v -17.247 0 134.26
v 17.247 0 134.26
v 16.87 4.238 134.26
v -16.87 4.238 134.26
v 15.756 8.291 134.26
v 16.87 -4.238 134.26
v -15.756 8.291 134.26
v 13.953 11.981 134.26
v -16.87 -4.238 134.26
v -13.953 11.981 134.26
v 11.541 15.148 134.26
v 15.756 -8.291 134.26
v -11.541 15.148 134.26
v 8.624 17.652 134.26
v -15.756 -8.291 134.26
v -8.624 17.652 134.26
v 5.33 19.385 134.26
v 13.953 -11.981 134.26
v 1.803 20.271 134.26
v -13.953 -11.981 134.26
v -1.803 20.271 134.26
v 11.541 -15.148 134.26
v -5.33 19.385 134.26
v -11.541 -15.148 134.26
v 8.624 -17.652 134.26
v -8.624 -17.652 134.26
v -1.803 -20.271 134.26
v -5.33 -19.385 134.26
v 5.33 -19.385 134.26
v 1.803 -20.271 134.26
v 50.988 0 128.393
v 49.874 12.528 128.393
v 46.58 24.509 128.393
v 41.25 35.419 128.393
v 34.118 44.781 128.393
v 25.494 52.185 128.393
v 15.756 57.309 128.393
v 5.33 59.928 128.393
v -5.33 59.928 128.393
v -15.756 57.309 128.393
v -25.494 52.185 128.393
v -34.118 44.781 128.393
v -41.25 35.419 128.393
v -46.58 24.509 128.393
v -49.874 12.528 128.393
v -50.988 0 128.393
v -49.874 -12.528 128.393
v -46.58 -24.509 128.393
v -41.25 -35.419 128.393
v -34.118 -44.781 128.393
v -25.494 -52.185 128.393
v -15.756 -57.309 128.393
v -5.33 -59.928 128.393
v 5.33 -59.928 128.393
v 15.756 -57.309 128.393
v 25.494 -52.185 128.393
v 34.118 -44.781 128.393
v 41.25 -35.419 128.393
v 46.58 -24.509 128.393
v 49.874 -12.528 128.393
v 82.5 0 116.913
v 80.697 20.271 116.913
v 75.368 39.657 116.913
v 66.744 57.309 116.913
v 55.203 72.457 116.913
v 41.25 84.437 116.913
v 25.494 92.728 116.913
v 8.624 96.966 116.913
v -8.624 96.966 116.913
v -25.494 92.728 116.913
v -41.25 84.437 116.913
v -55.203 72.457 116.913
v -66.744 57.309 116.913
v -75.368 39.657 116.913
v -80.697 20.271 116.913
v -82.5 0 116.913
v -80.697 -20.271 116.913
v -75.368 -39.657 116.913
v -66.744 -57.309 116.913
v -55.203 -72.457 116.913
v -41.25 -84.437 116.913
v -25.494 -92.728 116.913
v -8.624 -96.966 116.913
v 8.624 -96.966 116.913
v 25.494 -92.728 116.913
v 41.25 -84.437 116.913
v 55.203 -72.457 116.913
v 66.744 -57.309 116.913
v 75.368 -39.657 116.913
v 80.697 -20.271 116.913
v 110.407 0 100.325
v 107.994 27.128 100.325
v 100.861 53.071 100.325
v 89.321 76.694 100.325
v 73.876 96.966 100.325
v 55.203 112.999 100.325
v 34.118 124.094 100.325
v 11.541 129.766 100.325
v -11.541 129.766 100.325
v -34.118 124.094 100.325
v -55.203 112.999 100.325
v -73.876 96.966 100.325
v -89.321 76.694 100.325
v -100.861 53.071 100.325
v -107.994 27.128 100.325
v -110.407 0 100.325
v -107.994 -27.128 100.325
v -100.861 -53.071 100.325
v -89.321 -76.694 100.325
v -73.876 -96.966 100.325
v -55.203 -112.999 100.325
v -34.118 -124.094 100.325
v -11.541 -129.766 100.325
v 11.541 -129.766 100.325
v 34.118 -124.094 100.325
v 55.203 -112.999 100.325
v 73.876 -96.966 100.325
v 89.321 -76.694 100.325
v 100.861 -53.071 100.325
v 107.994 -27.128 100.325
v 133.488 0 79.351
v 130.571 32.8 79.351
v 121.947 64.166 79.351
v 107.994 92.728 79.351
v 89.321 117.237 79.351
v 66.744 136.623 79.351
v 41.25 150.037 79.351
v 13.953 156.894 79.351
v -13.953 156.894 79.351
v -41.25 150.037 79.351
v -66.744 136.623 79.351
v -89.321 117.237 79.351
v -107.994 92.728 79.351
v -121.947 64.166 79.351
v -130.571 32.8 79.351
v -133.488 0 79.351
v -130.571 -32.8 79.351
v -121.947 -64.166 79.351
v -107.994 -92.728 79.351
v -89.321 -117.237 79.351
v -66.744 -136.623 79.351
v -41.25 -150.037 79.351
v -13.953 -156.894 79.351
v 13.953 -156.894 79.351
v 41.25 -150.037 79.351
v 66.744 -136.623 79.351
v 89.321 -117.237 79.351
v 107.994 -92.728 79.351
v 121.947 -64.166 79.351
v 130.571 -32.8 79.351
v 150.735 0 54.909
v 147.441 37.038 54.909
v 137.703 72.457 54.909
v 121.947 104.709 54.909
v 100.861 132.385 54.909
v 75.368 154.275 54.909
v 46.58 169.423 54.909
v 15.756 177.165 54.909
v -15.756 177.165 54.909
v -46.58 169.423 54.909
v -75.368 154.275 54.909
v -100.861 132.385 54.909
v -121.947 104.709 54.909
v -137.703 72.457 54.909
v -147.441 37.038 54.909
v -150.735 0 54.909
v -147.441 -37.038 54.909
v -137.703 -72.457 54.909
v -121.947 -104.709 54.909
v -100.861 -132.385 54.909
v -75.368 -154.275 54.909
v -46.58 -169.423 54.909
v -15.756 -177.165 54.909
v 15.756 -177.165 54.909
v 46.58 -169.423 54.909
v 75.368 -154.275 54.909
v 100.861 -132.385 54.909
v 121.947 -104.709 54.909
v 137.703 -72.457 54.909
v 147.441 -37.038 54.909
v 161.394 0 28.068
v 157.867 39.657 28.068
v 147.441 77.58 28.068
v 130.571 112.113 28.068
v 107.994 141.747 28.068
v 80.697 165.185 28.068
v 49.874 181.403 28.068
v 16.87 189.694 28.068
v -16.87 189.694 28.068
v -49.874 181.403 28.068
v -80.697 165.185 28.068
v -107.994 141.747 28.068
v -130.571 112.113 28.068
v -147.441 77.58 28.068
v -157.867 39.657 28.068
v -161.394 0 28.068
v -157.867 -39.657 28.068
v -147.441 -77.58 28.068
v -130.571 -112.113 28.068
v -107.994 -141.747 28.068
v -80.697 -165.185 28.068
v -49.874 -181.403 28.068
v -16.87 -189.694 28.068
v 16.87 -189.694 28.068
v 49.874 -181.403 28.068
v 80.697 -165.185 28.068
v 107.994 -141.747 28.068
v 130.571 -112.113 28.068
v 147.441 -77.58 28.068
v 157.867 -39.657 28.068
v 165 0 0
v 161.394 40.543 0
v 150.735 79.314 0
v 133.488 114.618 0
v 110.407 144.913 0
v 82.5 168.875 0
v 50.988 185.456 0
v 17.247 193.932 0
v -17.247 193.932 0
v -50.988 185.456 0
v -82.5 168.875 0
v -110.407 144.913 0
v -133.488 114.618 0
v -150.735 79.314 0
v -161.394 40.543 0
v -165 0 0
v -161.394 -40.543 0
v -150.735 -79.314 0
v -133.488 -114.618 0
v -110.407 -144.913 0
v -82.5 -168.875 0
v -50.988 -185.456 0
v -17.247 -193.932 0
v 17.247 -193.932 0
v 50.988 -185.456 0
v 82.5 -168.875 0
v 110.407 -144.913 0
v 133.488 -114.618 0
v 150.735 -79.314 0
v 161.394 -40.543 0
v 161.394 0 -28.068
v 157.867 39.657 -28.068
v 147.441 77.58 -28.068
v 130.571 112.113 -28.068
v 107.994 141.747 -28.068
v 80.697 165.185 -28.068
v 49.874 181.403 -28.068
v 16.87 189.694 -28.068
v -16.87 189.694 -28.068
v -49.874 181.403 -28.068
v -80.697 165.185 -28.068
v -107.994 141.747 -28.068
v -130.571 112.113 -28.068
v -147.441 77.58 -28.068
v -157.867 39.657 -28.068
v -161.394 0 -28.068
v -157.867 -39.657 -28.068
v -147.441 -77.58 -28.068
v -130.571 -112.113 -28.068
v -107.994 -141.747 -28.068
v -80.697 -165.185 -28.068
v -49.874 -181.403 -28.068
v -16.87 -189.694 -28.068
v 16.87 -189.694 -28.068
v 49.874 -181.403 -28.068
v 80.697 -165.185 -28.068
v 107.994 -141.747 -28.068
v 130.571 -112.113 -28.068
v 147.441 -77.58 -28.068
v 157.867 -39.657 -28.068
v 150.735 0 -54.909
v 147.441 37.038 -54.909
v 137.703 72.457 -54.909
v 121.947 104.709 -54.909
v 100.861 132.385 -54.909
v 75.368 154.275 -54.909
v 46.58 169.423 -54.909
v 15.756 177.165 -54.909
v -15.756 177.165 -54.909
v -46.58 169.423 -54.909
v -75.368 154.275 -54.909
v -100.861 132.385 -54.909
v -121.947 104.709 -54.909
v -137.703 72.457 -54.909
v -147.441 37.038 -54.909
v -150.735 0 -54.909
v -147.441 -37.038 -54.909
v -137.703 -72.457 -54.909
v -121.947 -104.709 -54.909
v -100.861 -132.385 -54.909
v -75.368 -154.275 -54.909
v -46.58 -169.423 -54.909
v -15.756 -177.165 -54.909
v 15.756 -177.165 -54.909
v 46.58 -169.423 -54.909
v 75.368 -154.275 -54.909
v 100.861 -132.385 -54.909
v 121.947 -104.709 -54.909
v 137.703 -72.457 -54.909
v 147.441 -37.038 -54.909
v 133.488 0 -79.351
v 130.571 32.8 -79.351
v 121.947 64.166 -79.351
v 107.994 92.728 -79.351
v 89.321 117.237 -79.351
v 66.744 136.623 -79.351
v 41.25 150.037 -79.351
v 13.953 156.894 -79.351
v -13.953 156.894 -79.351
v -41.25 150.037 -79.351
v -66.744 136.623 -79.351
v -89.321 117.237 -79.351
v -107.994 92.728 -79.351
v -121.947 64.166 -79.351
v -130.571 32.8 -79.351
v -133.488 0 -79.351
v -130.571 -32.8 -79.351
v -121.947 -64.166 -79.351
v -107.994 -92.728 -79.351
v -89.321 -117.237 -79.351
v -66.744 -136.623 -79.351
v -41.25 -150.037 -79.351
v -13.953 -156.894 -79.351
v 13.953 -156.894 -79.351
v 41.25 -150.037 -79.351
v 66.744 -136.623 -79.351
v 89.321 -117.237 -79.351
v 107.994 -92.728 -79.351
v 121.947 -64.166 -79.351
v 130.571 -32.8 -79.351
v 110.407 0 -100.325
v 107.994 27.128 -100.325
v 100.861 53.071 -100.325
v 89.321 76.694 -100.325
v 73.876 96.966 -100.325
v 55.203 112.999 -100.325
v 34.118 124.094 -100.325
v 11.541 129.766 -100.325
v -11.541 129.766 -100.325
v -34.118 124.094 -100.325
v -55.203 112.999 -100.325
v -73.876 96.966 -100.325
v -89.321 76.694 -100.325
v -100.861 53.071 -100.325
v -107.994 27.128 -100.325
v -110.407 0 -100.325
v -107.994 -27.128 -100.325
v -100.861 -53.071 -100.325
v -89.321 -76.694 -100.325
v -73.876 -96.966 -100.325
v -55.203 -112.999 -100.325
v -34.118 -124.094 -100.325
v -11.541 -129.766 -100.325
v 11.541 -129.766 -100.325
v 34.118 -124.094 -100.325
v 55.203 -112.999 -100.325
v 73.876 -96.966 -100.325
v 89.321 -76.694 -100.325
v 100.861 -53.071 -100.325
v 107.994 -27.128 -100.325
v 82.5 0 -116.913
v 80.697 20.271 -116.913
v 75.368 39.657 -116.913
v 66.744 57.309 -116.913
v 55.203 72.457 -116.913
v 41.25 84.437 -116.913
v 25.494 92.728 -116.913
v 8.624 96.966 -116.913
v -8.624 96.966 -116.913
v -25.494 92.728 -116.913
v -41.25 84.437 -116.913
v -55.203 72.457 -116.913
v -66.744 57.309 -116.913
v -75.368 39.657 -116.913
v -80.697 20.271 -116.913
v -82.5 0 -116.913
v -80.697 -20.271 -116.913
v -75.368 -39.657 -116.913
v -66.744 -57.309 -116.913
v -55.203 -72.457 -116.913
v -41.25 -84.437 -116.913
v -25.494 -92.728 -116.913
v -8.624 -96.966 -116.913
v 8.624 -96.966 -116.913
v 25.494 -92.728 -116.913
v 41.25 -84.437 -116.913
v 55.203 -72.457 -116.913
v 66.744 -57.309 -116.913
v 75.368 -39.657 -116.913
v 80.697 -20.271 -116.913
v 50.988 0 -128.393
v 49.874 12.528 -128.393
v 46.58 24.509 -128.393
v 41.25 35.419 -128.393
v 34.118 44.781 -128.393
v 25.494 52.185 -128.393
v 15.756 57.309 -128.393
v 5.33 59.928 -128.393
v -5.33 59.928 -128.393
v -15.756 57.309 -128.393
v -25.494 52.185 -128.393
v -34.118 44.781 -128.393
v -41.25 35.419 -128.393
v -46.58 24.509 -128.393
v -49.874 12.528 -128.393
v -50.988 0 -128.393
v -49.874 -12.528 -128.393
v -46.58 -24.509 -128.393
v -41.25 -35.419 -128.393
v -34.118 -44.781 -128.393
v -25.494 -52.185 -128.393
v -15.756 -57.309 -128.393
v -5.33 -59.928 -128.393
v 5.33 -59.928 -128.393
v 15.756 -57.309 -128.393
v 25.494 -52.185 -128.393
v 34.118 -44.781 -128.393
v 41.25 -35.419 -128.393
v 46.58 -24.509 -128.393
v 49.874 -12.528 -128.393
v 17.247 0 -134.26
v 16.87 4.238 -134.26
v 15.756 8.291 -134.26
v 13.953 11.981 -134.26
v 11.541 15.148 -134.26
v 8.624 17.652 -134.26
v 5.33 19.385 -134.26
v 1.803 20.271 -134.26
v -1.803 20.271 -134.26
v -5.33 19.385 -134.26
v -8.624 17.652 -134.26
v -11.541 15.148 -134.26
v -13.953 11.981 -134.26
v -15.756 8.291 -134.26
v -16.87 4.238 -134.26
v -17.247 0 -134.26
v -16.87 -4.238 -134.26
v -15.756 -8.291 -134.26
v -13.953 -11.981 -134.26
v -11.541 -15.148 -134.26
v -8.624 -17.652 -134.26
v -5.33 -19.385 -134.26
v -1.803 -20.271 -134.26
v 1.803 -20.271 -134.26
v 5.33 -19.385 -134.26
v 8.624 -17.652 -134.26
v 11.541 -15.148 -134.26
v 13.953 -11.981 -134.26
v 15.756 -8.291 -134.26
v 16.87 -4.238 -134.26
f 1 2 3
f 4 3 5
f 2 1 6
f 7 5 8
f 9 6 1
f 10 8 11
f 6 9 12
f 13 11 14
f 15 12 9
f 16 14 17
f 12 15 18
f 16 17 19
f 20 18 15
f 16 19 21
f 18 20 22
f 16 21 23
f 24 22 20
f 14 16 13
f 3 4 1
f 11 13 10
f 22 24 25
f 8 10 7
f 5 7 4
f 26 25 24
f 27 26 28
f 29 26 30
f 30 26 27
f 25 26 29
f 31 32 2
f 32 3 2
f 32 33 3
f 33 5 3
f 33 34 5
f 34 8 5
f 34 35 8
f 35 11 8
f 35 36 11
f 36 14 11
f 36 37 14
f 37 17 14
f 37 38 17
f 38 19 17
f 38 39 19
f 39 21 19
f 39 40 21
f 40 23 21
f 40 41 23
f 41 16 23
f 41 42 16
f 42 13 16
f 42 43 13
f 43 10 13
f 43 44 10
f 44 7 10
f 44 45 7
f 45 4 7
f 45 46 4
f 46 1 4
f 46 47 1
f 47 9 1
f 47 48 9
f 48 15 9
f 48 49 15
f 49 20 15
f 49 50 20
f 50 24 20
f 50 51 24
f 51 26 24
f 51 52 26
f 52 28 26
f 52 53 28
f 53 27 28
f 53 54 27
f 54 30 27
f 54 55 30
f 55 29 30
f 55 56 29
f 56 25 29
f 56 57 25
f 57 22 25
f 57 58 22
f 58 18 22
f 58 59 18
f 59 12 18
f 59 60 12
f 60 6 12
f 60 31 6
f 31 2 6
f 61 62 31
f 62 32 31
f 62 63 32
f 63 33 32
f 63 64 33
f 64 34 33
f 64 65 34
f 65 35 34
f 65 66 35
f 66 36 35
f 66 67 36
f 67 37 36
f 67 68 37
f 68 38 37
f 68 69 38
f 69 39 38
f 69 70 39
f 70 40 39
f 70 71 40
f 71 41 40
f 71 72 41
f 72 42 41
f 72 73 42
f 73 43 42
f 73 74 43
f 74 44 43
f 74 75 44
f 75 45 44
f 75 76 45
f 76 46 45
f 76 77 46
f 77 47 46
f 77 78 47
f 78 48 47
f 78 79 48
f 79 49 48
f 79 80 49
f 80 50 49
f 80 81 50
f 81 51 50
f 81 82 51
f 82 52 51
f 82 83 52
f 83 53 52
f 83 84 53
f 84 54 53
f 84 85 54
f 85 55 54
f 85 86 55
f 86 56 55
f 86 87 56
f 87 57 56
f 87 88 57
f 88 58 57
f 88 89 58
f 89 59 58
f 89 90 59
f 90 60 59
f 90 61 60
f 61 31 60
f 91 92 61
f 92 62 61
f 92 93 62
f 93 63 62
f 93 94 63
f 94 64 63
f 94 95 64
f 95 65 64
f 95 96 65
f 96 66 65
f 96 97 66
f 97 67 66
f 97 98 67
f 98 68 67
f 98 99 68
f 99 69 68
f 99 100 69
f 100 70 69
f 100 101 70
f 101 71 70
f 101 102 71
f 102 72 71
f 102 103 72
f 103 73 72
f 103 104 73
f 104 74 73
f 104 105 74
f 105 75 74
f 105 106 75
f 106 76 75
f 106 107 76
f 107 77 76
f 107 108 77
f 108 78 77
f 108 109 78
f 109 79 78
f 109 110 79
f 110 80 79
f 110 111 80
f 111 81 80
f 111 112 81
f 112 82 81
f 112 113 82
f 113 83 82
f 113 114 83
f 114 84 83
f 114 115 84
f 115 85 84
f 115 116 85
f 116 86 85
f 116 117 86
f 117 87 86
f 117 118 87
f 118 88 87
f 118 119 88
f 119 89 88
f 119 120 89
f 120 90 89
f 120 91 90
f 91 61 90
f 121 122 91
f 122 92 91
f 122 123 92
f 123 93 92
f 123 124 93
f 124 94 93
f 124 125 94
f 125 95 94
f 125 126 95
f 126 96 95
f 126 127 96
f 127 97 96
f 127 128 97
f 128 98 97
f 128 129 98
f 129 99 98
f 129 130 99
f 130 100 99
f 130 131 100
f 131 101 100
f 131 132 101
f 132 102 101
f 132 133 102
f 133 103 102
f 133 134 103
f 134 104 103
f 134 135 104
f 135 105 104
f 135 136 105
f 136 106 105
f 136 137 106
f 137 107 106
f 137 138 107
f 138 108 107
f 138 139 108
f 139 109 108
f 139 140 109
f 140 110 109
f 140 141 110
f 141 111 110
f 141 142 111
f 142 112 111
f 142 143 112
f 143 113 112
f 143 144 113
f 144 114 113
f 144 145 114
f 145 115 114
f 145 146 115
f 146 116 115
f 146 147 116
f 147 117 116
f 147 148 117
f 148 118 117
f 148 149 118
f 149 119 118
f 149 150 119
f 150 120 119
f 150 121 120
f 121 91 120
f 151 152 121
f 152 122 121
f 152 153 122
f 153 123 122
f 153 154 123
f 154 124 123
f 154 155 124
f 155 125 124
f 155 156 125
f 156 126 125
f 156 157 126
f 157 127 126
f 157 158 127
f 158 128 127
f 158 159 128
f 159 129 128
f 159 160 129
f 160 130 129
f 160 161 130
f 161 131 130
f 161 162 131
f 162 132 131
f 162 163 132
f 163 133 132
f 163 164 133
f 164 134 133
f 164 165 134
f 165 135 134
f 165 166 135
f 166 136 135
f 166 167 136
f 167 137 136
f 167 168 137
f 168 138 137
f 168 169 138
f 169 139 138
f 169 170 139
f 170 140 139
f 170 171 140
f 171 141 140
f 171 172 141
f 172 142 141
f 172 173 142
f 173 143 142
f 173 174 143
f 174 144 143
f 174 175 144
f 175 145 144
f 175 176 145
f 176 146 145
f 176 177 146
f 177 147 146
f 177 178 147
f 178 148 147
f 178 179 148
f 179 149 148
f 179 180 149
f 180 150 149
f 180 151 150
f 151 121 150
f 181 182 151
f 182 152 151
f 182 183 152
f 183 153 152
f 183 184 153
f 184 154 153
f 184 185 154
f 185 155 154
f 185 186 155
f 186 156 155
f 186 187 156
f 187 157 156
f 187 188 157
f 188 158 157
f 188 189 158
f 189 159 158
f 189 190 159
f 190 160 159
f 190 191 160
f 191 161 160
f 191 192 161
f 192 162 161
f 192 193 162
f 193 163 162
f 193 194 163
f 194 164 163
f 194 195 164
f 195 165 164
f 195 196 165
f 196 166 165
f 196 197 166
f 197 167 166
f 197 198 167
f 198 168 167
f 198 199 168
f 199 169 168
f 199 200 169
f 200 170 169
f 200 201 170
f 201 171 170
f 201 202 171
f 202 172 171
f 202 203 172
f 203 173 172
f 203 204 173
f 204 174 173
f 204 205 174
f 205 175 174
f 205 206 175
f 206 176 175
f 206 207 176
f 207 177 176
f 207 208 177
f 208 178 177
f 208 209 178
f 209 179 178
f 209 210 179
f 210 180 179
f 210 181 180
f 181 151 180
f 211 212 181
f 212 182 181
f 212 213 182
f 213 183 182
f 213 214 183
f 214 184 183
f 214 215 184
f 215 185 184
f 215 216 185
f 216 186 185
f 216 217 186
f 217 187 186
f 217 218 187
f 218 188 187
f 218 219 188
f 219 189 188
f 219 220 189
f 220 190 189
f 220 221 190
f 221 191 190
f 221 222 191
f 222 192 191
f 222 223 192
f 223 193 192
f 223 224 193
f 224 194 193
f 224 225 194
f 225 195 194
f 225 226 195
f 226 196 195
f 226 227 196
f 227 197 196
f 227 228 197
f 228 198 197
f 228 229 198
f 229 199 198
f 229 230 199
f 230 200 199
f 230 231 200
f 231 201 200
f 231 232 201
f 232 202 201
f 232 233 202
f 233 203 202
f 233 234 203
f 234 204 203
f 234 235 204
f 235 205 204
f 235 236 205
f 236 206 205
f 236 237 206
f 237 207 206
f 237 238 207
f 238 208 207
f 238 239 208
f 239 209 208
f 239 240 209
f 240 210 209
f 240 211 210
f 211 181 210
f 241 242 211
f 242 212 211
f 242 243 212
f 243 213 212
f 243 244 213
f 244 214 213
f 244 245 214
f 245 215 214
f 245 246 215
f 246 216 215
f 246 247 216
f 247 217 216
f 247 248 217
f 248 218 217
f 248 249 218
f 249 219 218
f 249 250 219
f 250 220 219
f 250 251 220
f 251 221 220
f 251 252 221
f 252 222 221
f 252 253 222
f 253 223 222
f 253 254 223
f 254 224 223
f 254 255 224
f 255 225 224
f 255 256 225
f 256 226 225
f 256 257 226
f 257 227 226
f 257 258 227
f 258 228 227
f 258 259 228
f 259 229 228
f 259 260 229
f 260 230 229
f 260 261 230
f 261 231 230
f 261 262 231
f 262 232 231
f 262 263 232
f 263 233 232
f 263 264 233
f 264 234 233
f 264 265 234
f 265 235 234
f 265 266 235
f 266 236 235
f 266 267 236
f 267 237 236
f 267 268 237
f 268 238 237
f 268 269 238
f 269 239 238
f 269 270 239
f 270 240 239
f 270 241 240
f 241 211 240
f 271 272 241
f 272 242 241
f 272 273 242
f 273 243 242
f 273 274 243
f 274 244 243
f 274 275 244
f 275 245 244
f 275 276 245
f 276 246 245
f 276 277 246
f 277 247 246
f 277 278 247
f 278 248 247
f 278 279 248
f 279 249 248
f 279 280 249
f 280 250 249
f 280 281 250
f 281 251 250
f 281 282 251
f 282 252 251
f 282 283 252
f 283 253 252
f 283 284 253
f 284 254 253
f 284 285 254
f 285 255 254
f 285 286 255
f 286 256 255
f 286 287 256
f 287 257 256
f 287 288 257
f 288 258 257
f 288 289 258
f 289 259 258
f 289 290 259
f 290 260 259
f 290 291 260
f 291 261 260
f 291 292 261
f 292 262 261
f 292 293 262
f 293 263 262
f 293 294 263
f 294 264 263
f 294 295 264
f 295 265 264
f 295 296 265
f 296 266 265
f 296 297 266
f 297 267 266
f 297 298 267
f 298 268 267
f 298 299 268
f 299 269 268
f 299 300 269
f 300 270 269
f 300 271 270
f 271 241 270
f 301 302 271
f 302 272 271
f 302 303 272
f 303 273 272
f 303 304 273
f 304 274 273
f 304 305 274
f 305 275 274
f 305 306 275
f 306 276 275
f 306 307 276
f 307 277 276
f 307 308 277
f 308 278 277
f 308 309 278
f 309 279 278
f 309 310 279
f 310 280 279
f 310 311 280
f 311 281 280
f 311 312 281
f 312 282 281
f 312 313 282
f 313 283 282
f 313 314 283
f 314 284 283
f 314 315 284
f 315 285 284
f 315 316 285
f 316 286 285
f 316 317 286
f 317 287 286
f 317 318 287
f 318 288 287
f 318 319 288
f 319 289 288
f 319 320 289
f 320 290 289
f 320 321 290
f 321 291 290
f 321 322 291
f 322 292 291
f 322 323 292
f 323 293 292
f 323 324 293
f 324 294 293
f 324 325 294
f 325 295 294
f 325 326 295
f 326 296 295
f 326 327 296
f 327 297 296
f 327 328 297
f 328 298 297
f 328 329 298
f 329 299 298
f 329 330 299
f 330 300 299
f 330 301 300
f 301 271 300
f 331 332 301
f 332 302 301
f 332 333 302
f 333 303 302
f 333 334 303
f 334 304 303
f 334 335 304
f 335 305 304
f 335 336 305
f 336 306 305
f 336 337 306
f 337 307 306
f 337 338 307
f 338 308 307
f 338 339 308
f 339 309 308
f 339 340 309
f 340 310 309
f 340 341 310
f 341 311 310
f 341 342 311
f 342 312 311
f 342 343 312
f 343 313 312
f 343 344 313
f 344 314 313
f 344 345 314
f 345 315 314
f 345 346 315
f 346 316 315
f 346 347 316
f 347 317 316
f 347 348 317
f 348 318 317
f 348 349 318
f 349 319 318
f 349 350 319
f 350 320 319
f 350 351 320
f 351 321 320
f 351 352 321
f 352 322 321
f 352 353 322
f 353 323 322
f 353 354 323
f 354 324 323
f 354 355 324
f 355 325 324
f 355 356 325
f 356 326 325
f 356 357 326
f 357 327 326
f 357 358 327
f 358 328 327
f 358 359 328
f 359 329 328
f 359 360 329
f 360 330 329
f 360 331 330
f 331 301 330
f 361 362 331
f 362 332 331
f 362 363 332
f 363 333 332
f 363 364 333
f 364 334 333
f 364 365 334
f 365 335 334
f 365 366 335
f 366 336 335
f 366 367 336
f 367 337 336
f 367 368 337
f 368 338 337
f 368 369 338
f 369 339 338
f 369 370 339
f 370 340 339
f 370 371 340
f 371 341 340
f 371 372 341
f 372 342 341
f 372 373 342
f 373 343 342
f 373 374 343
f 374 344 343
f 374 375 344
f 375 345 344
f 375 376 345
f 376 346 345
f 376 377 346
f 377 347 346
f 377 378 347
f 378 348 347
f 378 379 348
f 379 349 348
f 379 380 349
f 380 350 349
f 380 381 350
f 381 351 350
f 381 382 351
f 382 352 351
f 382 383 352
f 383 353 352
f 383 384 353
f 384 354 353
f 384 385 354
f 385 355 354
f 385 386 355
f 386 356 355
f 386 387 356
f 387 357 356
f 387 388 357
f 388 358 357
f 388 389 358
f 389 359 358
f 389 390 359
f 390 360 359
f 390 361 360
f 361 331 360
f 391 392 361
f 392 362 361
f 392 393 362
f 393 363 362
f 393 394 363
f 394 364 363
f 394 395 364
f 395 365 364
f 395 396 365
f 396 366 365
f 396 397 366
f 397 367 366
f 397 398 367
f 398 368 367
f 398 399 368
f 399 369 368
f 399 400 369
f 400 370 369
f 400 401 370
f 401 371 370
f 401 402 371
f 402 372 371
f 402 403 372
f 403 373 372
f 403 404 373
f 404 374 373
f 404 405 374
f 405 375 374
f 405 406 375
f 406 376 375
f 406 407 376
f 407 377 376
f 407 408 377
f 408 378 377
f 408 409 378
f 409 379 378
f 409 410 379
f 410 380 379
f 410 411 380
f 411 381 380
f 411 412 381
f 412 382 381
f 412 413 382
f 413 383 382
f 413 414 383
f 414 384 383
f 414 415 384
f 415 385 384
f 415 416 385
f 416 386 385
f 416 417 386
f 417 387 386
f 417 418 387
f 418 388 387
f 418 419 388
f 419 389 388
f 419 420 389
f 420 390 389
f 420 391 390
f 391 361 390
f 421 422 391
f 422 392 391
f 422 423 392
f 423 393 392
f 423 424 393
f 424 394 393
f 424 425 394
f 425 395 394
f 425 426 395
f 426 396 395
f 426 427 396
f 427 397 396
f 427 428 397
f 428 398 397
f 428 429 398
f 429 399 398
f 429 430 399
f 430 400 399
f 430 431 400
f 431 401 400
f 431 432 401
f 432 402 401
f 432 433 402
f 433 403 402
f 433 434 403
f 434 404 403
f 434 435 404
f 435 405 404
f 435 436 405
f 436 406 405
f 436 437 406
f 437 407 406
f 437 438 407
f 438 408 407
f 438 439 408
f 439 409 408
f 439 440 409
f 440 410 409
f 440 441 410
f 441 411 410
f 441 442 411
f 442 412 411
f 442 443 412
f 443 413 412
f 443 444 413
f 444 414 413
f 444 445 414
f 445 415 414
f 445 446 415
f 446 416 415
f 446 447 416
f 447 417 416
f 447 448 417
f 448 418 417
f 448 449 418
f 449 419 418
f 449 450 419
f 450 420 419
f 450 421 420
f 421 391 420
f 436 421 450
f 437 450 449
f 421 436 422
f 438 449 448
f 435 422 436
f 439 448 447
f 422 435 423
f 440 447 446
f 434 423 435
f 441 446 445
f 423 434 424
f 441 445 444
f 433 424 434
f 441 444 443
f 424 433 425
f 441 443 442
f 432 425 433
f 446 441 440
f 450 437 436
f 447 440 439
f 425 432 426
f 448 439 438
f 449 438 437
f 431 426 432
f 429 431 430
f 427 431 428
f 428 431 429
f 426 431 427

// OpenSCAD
// Generated by SolidPython 1.0.1 on 2020-07-29 00:46:49


scale(v = [11, 13, 9]) {
	sphere(r = 15);
}
/***********************************************
*********      SolidPython code:      **********
************************************************
 
# import packages: SolidPython
from solid import *
from solid.utils import *
from itertools import chain, combinations, permutations


class Resize:

    def __init__(self, scad_file):
        self.scad_file = scad_file
        #self.scad_file = import_scad(scad_file)
        # cone/cylinder param:
        self.r1 = 0
        self.r2 = 0
        self.h = 0
        # rectangular prism param:
        self.w = 0
        self.l = 0
        # ellipse param:
        self.r = 0

    # import OpenScad code (file name corresponds to shape)


    # classify shape + parameters
    def assign(self, param1, param2, param3):
        if self.scad_file == 'cone.scad':
            self.r1 = param1
            self.r2 = param2
            self.h = param3
        elif self.scad_file == 'cylinder.scad':
            self.r1 = param1
            self.r2 = param2
            self.h = param3
        elif self.scad_file == 'rectangularPrism.scad':
            self.h = param1
            self.l = param2
            self.w = param3
        else:
            self.r = param1
            self.h = param2

    # resize parameters
    def iterate(self):
        x = range(3, 20, 2)
        i = 1
        if self.scad_file == 'cone.scad':
            tempList = list(permutations(x, 2))
            for temp in tempList:
                param1 = temp[0]
                param2 = temp[1]
                filepath = 'produced_scad_files/' + 'cone' + str(param1) + '_' + str(param2) + '_' + '.scad'
                scad_render_to_file(cylinder(h=param1, r1=param2, r2=0), filepath)

        elif self.scad_file == 'cylinder.scad':
            tempList = list(permutations(x, 3))
            for temp in tempList:
                param1 = temp[0]
                param2 = temp[1]
                filepath = 'produced_scad_files/' + 'cylinder' + str(param1) + '_' + str(param2) + '_' + '.scad'
                scad_render_to_file(cylinder(h=param1, r1=param2, r2=param2), filepath)

        elif self.scad_file == 'rectangularPrism.scad':
            tempList = list(permutations(x, 3))
            for temp in tempList:
                param1 = temp[0]
                param2 = temp[1]
                param3 = temp[2]
                filepath = 'produced_scad_files/' + 'rectangularPrism' + str(param1) + '_' + str(param2) + '_' + str(
                    param3) + '.scad'
                scad_render_to_file(cube(size=(param1, param2, param3)), filepath)

        elif self.scad_file == 'ellipse.scad':
            tempList = list(permutations(x, 4))
            for temp in tempList:
                param1 = temp[0]
                param2 = temp[1]
                param3 = temp[2]
                param4 = temp[3]
                filepath = 'produced_scad_files/' + 'ellipse' + str(param1) + '_' + str(param2) + '_' + str(param3) + '_' + str(param4) + '.scad'
                scad_render_to_file(scale([param1, param2, param3])(sphere(r=param4)), filepath)

    def render_to_scadfile(self):
        scad_render_to_file(scad, 'example.scad') 
 
************************************************/
